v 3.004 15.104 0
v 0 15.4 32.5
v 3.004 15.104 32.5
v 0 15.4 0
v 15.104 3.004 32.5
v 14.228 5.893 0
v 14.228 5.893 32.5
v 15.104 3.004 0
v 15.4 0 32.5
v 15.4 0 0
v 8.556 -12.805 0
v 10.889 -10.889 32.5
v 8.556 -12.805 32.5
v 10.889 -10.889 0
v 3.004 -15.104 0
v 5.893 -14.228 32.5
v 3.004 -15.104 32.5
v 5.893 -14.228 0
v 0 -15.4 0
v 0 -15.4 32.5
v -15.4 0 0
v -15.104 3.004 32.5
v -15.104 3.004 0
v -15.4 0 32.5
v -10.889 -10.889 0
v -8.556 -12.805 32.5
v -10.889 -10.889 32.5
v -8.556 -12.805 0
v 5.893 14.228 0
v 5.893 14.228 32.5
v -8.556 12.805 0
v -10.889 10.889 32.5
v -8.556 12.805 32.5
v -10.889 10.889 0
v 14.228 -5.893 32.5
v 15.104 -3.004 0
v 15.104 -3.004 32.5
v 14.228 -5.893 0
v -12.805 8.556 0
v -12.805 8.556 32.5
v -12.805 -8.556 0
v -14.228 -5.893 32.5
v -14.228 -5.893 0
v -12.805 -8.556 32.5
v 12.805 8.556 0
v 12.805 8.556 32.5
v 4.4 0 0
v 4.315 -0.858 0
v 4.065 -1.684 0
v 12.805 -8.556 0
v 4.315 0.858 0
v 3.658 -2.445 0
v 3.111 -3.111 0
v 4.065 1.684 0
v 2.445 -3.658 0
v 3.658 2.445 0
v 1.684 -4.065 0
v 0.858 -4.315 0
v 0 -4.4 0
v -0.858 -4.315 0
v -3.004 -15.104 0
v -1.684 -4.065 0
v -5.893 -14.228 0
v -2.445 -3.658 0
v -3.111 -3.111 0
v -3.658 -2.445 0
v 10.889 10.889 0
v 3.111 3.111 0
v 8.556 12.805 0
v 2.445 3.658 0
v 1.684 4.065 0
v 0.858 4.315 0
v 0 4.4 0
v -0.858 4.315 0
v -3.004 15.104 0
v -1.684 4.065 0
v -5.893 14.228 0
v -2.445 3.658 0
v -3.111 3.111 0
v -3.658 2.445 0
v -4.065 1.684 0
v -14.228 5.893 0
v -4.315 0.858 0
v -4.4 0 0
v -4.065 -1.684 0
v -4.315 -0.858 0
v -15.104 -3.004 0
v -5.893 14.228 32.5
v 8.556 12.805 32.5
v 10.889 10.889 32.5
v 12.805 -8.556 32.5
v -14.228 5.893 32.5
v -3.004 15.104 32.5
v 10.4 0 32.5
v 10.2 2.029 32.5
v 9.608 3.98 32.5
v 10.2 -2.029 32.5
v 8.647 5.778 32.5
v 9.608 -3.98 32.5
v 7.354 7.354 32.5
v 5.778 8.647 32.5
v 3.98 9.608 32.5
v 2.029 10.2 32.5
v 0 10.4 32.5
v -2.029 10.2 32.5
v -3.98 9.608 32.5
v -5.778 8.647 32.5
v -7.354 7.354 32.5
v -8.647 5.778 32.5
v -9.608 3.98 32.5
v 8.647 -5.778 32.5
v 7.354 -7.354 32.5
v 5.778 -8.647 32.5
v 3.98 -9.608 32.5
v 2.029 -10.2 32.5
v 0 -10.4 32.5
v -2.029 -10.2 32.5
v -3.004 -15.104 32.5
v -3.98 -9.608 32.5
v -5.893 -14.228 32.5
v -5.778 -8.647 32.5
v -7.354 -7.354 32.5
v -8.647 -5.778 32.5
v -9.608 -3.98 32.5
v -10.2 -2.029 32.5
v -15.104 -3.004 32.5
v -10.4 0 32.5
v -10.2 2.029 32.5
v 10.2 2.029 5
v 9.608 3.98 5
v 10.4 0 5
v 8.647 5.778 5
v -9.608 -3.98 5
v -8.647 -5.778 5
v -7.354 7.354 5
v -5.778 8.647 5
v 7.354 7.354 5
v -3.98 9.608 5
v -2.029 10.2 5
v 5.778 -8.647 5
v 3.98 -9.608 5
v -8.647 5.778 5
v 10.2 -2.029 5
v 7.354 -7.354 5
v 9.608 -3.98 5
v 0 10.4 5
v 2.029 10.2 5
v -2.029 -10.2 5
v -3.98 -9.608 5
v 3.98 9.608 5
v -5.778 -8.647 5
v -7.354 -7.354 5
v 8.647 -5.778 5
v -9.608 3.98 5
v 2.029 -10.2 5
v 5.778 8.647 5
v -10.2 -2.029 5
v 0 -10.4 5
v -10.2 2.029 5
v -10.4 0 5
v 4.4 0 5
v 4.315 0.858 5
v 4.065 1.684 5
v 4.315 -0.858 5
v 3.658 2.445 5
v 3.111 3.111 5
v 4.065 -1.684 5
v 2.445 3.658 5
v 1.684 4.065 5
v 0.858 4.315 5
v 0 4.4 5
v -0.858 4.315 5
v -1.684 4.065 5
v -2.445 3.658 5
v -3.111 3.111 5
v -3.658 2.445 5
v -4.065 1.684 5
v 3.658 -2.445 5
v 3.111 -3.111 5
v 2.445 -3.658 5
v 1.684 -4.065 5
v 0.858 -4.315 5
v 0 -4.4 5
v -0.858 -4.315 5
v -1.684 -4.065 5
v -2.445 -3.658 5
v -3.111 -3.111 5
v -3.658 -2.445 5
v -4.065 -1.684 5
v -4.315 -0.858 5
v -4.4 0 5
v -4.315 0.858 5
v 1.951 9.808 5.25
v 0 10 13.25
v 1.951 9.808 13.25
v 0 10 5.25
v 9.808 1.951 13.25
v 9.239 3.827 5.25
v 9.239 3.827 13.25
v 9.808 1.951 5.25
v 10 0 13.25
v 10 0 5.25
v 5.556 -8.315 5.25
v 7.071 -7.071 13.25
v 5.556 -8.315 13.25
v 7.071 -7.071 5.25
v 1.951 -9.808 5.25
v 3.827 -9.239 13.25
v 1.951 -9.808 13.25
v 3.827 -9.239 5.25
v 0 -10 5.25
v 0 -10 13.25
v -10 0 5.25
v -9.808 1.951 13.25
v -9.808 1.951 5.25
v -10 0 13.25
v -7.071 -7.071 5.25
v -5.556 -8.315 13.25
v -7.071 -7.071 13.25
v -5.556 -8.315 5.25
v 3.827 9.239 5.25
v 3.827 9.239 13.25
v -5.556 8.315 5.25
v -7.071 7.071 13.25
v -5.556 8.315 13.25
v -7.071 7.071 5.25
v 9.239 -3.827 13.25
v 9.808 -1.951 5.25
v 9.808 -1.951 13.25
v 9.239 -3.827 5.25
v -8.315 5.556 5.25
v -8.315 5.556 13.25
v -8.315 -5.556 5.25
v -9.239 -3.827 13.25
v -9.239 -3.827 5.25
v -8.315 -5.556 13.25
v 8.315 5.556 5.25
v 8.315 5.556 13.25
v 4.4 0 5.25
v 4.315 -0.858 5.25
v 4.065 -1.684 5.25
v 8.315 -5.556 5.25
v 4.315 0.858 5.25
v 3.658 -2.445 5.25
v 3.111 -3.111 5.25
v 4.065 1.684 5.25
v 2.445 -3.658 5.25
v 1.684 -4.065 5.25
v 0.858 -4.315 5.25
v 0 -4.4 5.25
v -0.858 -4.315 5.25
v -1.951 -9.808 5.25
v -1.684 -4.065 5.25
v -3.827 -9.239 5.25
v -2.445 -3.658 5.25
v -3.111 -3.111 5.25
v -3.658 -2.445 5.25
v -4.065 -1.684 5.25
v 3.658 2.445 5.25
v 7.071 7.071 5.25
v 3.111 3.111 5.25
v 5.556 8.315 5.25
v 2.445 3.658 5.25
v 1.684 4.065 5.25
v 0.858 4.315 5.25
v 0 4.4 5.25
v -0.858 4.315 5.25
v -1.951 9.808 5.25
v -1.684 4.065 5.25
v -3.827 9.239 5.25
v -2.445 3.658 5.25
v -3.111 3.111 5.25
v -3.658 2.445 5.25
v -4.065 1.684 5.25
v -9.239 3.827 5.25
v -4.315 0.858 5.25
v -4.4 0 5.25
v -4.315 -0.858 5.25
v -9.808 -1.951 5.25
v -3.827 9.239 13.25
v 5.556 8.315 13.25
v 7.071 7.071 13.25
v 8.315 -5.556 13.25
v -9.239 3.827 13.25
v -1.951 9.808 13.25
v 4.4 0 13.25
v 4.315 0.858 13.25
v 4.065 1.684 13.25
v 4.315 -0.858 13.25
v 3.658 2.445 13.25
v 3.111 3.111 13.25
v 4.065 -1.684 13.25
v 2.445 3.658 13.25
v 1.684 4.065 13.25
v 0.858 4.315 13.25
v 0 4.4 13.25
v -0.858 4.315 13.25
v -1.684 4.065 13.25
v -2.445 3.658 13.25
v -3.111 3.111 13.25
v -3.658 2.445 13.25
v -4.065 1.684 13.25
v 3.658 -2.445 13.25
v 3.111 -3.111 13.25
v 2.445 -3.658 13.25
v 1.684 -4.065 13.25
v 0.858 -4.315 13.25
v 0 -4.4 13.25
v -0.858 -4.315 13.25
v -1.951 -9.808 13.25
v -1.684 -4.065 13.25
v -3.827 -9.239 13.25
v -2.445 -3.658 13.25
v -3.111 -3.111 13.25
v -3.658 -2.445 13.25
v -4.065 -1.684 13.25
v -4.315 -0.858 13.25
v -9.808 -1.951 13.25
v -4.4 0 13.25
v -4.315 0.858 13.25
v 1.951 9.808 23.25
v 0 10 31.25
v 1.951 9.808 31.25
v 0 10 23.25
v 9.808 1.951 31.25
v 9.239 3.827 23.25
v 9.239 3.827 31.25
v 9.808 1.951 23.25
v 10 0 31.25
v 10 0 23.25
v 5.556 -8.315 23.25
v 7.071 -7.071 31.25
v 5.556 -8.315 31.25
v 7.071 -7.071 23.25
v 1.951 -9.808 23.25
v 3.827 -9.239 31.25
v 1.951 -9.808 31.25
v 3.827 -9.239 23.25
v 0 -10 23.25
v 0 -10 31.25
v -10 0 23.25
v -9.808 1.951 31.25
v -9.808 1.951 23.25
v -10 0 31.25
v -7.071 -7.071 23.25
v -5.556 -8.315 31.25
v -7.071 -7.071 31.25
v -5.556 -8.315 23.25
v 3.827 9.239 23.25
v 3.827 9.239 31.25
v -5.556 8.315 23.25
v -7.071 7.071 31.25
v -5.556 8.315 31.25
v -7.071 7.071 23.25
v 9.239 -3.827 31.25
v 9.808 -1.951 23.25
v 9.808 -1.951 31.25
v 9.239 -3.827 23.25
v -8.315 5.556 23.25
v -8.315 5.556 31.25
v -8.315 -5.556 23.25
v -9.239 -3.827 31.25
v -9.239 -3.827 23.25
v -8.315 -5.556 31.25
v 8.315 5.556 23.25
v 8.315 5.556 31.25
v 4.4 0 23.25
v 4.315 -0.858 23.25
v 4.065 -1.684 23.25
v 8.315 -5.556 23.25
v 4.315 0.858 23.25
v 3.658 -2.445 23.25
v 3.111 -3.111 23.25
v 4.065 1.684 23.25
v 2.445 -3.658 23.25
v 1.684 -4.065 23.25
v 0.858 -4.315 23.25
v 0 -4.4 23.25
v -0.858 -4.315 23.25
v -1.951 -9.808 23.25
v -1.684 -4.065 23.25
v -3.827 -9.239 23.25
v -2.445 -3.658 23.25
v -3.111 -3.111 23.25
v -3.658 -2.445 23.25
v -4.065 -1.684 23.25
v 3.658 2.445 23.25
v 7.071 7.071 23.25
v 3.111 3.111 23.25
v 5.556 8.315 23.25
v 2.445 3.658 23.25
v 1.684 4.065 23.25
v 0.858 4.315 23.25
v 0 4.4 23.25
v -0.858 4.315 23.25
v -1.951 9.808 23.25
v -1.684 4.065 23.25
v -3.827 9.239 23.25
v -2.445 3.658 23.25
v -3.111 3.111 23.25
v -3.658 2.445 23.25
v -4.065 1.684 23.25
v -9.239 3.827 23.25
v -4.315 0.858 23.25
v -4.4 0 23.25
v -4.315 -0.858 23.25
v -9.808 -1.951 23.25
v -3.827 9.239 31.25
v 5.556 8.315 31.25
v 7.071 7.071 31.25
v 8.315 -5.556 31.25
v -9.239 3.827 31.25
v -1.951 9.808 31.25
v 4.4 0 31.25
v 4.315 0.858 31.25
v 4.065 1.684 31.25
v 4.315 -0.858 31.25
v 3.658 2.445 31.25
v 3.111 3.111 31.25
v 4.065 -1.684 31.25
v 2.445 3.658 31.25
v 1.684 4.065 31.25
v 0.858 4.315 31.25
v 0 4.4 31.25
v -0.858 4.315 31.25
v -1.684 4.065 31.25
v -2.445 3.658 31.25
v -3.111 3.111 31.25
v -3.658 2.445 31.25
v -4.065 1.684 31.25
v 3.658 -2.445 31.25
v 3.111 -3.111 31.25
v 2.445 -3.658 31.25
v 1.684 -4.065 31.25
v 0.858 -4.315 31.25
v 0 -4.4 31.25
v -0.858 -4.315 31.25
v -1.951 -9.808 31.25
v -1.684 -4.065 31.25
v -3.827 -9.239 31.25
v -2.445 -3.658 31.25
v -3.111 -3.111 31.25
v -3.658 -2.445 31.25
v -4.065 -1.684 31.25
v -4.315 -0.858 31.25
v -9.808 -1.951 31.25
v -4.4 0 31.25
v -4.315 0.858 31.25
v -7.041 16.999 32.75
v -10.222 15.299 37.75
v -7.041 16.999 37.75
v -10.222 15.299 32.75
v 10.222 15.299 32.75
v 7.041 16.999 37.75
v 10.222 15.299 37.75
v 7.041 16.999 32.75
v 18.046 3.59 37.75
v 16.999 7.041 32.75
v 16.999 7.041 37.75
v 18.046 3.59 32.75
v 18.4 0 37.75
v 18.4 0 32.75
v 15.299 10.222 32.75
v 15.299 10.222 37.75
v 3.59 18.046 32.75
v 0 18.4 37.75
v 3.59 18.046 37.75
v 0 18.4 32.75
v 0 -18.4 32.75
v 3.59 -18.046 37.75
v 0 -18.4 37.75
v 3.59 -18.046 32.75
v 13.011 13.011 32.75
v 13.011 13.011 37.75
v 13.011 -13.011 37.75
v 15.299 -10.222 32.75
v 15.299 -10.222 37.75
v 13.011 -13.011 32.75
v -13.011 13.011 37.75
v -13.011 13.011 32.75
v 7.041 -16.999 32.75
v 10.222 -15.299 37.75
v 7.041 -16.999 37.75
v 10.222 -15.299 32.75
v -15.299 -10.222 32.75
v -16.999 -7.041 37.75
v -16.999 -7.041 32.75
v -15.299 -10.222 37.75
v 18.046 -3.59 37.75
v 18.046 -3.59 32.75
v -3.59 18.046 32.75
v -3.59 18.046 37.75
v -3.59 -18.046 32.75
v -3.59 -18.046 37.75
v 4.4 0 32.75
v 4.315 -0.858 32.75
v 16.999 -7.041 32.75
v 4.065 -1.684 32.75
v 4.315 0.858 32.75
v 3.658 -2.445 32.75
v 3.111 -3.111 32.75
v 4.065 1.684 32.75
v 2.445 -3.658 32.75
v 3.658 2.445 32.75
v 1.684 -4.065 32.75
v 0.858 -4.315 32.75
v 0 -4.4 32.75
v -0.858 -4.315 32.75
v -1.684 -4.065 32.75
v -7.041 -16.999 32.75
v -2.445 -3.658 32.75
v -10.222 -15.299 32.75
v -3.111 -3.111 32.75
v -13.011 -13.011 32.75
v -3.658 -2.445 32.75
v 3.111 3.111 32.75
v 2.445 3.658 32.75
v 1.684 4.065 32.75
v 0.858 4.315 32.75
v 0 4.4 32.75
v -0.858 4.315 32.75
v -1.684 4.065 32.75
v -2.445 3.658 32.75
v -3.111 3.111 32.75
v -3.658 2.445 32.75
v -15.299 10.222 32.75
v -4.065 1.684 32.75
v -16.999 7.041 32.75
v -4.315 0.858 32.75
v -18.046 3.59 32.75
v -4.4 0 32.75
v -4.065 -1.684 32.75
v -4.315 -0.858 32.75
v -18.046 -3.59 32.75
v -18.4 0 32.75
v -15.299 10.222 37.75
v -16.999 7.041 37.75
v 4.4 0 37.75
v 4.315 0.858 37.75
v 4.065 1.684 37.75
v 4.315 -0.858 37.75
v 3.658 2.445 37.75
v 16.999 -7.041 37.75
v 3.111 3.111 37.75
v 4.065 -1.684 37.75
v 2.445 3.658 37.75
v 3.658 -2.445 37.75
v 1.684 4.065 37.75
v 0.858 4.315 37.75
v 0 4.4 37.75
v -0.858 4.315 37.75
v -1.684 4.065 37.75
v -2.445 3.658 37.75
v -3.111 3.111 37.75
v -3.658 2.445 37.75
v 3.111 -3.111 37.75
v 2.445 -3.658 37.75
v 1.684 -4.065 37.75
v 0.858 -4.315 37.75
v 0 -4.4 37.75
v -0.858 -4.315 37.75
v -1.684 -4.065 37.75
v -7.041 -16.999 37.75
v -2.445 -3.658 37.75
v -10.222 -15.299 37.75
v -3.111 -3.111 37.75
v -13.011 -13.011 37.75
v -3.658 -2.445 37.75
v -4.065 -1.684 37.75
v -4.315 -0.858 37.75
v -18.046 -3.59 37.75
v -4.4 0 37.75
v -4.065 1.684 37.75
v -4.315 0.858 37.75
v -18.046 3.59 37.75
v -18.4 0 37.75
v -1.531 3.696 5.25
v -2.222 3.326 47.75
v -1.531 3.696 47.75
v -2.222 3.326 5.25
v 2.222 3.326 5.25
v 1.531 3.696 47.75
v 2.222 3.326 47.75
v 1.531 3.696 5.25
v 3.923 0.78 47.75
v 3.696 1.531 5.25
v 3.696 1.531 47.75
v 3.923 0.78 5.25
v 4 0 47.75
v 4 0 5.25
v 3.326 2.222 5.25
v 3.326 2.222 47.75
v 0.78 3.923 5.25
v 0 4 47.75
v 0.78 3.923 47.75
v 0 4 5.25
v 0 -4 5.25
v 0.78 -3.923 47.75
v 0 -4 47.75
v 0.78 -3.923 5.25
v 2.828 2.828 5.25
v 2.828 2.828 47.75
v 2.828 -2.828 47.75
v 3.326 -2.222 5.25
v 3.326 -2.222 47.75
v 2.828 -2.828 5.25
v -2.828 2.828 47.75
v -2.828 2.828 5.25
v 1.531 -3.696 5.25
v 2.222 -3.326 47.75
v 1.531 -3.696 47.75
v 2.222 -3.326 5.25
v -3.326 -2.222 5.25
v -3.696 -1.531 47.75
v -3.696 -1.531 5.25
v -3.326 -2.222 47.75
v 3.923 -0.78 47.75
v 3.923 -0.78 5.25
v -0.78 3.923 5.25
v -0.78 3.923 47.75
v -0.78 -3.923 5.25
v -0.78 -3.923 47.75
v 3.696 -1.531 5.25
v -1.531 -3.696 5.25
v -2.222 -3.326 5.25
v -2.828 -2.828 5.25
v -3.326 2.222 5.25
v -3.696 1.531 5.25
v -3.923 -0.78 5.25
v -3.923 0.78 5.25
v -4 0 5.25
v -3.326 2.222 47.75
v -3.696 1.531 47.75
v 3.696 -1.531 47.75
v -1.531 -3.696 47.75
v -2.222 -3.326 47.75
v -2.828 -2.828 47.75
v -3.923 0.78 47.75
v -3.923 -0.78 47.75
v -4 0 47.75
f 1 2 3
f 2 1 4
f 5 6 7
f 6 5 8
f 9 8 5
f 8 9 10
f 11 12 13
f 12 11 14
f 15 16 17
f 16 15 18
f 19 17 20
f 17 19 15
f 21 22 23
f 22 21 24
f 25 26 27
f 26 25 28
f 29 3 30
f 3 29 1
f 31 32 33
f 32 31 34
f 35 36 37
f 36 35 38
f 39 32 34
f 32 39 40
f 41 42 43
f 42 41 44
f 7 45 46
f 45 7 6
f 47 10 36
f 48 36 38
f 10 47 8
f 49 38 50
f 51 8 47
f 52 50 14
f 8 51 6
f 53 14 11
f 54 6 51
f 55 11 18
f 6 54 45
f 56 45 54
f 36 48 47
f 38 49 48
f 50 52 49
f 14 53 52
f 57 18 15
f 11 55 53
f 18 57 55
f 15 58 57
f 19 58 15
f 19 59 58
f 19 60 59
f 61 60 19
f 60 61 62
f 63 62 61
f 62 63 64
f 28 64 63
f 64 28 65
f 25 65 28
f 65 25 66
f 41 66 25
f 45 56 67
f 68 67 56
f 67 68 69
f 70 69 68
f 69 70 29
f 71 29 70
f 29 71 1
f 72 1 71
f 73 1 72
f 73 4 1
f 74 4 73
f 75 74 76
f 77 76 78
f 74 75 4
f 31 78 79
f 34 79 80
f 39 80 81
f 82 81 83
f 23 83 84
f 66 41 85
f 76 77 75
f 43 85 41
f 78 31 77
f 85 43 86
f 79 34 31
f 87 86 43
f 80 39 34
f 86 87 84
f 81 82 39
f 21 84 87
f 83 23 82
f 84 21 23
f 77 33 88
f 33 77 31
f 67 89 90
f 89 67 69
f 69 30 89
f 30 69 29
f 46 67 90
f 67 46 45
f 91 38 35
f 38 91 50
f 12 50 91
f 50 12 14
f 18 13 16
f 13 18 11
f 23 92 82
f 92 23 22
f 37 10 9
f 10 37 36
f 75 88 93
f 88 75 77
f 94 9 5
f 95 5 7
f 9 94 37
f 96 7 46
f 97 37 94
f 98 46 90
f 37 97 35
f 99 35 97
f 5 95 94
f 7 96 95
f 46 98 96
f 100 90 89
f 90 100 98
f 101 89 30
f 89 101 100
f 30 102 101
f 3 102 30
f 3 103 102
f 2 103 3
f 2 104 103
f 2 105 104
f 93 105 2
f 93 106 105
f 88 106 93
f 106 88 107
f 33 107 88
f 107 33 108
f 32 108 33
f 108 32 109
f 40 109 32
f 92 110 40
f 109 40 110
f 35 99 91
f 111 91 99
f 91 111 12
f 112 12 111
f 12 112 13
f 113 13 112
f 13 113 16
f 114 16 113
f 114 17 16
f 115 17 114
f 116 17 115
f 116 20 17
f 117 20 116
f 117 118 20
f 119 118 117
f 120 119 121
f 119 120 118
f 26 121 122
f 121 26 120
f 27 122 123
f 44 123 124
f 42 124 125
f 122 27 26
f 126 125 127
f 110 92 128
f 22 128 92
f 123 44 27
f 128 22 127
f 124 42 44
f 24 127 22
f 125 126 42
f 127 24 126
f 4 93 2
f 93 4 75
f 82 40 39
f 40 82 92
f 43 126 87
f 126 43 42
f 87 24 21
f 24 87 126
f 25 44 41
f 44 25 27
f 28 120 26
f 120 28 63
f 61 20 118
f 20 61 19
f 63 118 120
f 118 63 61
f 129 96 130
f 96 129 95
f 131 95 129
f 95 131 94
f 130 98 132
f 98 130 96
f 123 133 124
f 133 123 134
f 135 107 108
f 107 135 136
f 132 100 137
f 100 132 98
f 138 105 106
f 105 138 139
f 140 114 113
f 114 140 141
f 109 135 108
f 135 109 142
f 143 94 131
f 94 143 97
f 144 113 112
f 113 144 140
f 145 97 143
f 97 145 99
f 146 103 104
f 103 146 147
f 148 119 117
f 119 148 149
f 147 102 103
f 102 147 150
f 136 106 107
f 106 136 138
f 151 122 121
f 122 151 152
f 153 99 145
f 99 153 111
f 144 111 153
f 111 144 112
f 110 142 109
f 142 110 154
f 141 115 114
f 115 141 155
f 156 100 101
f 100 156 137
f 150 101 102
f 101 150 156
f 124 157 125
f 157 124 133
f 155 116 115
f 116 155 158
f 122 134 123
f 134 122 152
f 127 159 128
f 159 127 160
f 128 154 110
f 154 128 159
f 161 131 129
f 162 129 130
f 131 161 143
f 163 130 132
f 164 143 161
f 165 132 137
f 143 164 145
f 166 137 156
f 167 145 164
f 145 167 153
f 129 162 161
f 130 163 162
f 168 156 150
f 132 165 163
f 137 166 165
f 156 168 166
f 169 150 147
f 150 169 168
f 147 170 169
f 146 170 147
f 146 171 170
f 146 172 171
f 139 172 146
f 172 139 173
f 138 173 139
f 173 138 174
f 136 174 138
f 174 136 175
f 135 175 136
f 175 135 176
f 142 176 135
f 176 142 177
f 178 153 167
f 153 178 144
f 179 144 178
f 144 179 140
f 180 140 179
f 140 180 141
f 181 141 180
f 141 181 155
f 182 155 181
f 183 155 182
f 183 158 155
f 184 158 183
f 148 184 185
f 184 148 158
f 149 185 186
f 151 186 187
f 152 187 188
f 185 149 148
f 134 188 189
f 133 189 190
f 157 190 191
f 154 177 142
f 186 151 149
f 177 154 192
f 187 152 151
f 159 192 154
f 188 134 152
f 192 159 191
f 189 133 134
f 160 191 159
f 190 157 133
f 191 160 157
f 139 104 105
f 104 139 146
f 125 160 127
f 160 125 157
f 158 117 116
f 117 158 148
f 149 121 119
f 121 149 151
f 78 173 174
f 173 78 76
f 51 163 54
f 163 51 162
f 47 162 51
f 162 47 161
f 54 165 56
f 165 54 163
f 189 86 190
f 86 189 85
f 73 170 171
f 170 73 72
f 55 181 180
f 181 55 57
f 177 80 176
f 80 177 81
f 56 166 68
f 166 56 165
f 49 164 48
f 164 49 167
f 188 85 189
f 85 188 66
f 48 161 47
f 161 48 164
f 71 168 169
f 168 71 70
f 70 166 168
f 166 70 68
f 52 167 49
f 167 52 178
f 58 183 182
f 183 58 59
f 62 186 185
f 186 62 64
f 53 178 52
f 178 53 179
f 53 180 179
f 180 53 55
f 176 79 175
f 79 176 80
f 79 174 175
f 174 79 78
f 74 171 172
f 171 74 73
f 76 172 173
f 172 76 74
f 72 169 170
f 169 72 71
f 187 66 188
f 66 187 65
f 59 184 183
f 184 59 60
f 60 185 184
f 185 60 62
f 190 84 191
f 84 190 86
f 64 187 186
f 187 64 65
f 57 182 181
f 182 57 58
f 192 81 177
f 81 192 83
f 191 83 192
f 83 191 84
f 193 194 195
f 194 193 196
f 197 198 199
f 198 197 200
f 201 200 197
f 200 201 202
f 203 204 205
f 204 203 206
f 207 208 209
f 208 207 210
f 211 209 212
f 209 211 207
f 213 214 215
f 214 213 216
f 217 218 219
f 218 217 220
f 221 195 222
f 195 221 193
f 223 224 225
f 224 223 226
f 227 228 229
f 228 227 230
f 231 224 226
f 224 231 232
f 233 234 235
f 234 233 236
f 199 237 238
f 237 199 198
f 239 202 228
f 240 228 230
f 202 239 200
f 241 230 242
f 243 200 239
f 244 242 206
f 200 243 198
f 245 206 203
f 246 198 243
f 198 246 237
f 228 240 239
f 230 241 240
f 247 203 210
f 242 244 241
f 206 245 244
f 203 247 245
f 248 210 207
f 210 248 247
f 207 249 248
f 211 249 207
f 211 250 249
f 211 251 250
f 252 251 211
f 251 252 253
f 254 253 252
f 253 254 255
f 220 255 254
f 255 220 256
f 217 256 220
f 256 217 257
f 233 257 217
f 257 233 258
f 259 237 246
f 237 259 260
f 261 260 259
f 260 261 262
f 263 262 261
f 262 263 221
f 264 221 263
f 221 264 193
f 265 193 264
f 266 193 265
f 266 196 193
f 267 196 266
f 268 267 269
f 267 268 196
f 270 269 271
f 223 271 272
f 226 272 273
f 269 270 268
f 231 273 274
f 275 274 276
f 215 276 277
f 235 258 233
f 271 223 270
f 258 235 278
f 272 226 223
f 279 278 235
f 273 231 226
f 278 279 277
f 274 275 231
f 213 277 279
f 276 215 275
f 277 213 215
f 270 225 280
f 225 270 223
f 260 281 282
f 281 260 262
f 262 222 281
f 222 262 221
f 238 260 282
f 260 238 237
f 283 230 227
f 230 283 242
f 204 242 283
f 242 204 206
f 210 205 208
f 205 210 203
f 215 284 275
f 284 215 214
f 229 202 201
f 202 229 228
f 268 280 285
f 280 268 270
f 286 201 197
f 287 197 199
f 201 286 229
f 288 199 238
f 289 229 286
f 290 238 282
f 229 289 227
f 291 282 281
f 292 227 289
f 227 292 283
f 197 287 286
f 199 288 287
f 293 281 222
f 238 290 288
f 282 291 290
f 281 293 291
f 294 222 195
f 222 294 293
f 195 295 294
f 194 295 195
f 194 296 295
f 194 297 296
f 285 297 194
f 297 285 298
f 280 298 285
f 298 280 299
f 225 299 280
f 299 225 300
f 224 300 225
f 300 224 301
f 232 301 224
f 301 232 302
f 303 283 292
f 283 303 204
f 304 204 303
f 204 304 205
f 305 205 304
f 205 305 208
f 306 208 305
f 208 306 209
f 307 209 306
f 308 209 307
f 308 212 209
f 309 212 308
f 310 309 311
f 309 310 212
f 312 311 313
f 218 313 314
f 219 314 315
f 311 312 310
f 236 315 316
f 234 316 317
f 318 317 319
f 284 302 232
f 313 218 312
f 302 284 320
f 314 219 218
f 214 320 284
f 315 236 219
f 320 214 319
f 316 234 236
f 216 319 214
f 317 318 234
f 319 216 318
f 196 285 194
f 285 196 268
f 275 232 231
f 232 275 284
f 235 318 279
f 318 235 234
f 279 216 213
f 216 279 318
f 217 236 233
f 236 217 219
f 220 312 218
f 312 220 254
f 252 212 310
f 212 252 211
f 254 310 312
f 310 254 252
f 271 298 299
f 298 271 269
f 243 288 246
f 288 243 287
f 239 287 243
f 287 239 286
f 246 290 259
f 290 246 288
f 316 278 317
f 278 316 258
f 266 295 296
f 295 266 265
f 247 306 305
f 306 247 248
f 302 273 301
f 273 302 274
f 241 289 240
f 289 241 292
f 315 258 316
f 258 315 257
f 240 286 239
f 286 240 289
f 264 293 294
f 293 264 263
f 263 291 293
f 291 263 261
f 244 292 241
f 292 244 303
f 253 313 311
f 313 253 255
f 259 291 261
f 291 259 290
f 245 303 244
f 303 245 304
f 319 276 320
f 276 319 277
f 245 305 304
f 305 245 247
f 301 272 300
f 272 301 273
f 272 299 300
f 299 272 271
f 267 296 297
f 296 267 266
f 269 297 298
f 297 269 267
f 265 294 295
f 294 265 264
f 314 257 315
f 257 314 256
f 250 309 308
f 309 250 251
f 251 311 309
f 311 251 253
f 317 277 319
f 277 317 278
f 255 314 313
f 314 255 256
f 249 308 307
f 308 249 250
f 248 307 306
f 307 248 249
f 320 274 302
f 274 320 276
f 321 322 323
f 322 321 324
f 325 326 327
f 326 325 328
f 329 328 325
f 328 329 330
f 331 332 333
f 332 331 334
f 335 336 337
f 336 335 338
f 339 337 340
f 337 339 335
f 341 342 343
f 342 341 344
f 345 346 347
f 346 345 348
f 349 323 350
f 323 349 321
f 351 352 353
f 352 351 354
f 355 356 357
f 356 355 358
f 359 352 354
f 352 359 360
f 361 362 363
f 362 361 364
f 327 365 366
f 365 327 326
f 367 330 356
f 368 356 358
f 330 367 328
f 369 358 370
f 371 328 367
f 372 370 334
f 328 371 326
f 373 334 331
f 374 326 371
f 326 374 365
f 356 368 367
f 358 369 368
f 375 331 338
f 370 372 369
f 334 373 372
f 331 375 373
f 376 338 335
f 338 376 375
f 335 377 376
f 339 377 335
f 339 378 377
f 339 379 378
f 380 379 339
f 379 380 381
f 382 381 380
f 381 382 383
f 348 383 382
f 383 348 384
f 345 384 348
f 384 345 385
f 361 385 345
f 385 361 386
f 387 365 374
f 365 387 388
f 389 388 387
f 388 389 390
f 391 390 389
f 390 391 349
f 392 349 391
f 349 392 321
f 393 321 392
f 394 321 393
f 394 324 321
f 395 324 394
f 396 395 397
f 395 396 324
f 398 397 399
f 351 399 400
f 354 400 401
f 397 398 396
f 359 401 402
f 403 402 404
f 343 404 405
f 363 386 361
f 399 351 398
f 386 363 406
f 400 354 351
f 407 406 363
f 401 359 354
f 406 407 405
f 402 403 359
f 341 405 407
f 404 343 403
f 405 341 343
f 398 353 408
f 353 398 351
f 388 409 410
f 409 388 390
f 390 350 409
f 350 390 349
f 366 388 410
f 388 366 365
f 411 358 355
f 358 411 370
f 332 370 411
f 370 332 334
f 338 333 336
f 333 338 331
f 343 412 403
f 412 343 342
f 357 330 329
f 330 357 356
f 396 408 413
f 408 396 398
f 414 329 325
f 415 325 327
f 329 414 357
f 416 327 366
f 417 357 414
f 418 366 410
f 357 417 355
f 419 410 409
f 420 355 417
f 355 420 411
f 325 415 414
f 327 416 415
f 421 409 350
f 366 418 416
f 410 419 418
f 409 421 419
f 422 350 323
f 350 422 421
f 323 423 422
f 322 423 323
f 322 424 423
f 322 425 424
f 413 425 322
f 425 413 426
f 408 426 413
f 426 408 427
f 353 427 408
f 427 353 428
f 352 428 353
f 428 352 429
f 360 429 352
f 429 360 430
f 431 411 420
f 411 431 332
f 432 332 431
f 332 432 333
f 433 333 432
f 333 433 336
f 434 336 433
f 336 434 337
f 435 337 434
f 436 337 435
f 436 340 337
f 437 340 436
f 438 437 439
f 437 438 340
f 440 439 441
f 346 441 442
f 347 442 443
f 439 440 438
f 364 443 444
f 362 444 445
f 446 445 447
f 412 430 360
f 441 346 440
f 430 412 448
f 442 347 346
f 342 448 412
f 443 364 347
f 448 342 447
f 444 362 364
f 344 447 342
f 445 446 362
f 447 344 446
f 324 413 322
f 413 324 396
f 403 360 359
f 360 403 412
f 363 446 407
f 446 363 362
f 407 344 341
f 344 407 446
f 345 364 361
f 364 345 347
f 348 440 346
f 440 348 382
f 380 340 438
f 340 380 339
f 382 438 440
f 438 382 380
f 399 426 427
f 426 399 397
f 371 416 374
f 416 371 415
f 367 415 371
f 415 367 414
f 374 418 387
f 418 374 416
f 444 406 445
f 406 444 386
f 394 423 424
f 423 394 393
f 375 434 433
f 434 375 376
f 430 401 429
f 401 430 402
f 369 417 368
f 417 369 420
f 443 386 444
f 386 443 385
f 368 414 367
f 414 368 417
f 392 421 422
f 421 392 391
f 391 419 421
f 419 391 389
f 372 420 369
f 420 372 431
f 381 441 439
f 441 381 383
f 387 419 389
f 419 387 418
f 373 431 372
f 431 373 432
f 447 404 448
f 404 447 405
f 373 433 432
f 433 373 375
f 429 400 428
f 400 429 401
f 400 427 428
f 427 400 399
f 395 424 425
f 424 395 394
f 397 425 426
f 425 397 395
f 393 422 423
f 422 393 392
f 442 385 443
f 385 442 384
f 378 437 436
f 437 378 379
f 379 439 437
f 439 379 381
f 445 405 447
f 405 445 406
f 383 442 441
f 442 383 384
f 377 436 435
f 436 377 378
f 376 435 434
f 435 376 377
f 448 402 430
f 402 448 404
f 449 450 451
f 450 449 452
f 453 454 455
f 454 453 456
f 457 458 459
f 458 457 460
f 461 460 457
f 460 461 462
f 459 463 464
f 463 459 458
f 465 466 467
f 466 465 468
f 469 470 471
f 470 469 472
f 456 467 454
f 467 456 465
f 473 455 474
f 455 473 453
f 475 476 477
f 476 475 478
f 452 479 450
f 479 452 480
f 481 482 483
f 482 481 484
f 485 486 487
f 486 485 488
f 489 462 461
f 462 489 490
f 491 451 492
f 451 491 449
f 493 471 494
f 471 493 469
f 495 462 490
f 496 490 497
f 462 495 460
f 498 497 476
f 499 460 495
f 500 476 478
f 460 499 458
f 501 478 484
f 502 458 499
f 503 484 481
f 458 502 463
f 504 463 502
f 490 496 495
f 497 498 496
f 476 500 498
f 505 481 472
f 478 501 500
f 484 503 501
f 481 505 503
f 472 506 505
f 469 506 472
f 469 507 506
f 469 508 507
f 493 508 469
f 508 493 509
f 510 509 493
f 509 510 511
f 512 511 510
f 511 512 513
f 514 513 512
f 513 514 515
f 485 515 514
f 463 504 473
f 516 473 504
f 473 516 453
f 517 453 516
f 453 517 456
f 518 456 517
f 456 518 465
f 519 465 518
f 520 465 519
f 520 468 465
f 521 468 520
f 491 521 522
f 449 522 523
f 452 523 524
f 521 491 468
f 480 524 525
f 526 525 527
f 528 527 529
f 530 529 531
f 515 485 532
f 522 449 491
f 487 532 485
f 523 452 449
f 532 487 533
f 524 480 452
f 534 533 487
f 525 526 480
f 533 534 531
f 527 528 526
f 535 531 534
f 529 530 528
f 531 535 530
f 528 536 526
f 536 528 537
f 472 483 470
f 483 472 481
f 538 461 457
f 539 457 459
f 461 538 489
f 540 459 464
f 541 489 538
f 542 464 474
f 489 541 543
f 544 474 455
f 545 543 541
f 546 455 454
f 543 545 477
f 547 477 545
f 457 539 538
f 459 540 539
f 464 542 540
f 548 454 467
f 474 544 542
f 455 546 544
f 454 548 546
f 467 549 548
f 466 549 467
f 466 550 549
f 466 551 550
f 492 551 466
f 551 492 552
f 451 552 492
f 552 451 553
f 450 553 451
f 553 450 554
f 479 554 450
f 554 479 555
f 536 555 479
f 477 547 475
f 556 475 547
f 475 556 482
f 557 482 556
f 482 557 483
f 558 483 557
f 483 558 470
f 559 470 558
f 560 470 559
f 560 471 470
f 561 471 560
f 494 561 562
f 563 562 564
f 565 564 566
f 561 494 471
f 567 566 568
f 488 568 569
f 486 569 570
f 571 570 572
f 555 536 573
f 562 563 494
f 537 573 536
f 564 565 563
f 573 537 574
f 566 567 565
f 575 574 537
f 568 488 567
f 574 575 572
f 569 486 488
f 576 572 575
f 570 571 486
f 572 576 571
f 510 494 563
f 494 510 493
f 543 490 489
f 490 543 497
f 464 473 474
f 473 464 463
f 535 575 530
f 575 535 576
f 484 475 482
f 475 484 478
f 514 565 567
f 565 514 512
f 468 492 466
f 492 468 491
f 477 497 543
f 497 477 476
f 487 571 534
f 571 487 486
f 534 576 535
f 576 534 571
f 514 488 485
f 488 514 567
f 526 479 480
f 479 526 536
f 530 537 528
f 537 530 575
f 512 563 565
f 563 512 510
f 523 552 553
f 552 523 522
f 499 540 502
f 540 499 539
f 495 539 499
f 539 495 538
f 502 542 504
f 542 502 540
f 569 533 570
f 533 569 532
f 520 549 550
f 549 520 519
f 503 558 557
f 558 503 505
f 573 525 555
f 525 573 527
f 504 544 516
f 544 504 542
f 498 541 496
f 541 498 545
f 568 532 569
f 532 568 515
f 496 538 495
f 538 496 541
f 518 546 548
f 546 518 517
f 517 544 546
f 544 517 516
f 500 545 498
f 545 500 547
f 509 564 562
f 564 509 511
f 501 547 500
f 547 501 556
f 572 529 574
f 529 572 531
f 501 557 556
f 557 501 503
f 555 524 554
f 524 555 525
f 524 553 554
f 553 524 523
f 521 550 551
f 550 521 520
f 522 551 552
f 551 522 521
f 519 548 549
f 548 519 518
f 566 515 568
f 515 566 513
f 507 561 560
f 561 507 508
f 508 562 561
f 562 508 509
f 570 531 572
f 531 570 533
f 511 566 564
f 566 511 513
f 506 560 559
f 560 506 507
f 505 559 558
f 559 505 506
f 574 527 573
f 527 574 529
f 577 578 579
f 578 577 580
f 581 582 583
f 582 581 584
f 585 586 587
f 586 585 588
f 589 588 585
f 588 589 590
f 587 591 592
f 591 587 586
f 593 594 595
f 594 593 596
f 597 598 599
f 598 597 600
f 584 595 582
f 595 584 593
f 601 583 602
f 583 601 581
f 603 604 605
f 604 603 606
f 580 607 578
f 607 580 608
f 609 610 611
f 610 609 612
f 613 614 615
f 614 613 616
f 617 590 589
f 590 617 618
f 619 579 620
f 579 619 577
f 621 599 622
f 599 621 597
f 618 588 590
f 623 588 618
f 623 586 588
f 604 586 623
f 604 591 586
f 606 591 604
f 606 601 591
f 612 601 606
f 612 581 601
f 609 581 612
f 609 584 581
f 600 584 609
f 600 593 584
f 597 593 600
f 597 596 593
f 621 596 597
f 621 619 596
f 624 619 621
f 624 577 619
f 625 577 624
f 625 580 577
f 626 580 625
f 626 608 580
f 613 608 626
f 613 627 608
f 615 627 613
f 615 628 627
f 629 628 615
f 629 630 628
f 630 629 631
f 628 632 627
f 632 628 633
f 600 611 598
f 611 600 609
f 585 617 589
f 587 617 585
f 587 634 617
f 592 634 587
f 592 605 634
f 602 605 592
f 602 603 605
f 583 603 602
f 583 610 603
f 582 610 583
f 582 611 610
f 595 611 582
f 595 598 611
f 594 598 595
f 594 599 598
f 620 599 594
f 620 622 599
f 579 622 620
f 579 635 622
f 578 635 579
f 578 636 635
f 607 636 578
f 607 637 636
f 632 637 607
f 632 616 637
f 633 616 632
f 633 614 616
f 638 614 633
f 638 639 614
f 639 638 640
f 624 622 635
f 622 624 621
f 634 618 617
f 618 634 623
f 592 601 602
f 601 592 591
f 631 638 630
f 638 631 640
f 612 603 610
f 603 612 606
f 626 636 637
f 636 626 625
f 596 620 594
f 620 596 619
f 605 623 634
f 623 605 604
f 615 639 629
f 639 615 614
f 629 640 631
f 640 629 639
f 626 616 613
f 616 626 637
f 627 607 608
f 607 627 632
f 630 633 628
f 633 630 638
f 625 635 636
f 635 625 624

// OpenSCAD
$fn = 32;

// ------------------------------------------------------------------------
// Shaft station: cup d30.8 x 32.5 mm, shaft d8
// Every part is its own module, assembly() places every instance.
// ------------------------------------------------------------------------

// --- part 1 ---
module housing_cup() {
  difference() {
    cylinder(h = 32.5, d = 30.8);
    translate([0, 0, 5]) cylinder(h = 28.5, d = 20.8);
    translate([0, 0, -1]) cylinder(h = 7, d = 8.8);
  }
}

// --- part 2 ---
module bearing_lower() {
  difference() {
      translate([0, 0, 0]) cylinder(h = 8, d = 20);
      translate([0, 0, -1]) cylinder(h = 10, d = 8.8);
    }
}

// --- part 3 ---
module bearing_upper() {
  difference() {
      translate([0, 0, 0]) cylinder(h = 8, d = 20);
      translate([0, 0, -1]) cylinder(h = 10, d = 8.8);
    }
}

// --- part 4 ---
module station_shaft() {
  translate([0, 0, -21.25]) cylinder(h = 42.5, d = 8);
}

// --- part 5 ---
module station_cover() {
  difference() {
    cylinder(h = 5, d = 36.8);
    translate([0, 0, -1]) cylinder(h = 7, d = 8.8);
  }
}

// --- assembly ---
module assembly() {
  color([0.80, 0.24, 0.20]) translate([0, 0, 0]) rotate([0, 0, 0]) housing_cup();
  color([0.20, 0.45, 0.75]) translate([0, 0, 5.25]) rotate([0, 0, 0]) bearing_lower();
  color([0.25, 0.62, 0.32]) translate([0, 0, 23.25]) rotate([0, 0, 0]) bearing_upper();
  color([0.92, 0.70, 0.18]) translate([0, 0, 26.5]) rotate([0, 0, 0]) station_shaft();
  color([0.58, 0.35, 0.70]) translate([0, 0, 32.75]) rotate([0, 0, 0]) station_cover();
}

assembly();
